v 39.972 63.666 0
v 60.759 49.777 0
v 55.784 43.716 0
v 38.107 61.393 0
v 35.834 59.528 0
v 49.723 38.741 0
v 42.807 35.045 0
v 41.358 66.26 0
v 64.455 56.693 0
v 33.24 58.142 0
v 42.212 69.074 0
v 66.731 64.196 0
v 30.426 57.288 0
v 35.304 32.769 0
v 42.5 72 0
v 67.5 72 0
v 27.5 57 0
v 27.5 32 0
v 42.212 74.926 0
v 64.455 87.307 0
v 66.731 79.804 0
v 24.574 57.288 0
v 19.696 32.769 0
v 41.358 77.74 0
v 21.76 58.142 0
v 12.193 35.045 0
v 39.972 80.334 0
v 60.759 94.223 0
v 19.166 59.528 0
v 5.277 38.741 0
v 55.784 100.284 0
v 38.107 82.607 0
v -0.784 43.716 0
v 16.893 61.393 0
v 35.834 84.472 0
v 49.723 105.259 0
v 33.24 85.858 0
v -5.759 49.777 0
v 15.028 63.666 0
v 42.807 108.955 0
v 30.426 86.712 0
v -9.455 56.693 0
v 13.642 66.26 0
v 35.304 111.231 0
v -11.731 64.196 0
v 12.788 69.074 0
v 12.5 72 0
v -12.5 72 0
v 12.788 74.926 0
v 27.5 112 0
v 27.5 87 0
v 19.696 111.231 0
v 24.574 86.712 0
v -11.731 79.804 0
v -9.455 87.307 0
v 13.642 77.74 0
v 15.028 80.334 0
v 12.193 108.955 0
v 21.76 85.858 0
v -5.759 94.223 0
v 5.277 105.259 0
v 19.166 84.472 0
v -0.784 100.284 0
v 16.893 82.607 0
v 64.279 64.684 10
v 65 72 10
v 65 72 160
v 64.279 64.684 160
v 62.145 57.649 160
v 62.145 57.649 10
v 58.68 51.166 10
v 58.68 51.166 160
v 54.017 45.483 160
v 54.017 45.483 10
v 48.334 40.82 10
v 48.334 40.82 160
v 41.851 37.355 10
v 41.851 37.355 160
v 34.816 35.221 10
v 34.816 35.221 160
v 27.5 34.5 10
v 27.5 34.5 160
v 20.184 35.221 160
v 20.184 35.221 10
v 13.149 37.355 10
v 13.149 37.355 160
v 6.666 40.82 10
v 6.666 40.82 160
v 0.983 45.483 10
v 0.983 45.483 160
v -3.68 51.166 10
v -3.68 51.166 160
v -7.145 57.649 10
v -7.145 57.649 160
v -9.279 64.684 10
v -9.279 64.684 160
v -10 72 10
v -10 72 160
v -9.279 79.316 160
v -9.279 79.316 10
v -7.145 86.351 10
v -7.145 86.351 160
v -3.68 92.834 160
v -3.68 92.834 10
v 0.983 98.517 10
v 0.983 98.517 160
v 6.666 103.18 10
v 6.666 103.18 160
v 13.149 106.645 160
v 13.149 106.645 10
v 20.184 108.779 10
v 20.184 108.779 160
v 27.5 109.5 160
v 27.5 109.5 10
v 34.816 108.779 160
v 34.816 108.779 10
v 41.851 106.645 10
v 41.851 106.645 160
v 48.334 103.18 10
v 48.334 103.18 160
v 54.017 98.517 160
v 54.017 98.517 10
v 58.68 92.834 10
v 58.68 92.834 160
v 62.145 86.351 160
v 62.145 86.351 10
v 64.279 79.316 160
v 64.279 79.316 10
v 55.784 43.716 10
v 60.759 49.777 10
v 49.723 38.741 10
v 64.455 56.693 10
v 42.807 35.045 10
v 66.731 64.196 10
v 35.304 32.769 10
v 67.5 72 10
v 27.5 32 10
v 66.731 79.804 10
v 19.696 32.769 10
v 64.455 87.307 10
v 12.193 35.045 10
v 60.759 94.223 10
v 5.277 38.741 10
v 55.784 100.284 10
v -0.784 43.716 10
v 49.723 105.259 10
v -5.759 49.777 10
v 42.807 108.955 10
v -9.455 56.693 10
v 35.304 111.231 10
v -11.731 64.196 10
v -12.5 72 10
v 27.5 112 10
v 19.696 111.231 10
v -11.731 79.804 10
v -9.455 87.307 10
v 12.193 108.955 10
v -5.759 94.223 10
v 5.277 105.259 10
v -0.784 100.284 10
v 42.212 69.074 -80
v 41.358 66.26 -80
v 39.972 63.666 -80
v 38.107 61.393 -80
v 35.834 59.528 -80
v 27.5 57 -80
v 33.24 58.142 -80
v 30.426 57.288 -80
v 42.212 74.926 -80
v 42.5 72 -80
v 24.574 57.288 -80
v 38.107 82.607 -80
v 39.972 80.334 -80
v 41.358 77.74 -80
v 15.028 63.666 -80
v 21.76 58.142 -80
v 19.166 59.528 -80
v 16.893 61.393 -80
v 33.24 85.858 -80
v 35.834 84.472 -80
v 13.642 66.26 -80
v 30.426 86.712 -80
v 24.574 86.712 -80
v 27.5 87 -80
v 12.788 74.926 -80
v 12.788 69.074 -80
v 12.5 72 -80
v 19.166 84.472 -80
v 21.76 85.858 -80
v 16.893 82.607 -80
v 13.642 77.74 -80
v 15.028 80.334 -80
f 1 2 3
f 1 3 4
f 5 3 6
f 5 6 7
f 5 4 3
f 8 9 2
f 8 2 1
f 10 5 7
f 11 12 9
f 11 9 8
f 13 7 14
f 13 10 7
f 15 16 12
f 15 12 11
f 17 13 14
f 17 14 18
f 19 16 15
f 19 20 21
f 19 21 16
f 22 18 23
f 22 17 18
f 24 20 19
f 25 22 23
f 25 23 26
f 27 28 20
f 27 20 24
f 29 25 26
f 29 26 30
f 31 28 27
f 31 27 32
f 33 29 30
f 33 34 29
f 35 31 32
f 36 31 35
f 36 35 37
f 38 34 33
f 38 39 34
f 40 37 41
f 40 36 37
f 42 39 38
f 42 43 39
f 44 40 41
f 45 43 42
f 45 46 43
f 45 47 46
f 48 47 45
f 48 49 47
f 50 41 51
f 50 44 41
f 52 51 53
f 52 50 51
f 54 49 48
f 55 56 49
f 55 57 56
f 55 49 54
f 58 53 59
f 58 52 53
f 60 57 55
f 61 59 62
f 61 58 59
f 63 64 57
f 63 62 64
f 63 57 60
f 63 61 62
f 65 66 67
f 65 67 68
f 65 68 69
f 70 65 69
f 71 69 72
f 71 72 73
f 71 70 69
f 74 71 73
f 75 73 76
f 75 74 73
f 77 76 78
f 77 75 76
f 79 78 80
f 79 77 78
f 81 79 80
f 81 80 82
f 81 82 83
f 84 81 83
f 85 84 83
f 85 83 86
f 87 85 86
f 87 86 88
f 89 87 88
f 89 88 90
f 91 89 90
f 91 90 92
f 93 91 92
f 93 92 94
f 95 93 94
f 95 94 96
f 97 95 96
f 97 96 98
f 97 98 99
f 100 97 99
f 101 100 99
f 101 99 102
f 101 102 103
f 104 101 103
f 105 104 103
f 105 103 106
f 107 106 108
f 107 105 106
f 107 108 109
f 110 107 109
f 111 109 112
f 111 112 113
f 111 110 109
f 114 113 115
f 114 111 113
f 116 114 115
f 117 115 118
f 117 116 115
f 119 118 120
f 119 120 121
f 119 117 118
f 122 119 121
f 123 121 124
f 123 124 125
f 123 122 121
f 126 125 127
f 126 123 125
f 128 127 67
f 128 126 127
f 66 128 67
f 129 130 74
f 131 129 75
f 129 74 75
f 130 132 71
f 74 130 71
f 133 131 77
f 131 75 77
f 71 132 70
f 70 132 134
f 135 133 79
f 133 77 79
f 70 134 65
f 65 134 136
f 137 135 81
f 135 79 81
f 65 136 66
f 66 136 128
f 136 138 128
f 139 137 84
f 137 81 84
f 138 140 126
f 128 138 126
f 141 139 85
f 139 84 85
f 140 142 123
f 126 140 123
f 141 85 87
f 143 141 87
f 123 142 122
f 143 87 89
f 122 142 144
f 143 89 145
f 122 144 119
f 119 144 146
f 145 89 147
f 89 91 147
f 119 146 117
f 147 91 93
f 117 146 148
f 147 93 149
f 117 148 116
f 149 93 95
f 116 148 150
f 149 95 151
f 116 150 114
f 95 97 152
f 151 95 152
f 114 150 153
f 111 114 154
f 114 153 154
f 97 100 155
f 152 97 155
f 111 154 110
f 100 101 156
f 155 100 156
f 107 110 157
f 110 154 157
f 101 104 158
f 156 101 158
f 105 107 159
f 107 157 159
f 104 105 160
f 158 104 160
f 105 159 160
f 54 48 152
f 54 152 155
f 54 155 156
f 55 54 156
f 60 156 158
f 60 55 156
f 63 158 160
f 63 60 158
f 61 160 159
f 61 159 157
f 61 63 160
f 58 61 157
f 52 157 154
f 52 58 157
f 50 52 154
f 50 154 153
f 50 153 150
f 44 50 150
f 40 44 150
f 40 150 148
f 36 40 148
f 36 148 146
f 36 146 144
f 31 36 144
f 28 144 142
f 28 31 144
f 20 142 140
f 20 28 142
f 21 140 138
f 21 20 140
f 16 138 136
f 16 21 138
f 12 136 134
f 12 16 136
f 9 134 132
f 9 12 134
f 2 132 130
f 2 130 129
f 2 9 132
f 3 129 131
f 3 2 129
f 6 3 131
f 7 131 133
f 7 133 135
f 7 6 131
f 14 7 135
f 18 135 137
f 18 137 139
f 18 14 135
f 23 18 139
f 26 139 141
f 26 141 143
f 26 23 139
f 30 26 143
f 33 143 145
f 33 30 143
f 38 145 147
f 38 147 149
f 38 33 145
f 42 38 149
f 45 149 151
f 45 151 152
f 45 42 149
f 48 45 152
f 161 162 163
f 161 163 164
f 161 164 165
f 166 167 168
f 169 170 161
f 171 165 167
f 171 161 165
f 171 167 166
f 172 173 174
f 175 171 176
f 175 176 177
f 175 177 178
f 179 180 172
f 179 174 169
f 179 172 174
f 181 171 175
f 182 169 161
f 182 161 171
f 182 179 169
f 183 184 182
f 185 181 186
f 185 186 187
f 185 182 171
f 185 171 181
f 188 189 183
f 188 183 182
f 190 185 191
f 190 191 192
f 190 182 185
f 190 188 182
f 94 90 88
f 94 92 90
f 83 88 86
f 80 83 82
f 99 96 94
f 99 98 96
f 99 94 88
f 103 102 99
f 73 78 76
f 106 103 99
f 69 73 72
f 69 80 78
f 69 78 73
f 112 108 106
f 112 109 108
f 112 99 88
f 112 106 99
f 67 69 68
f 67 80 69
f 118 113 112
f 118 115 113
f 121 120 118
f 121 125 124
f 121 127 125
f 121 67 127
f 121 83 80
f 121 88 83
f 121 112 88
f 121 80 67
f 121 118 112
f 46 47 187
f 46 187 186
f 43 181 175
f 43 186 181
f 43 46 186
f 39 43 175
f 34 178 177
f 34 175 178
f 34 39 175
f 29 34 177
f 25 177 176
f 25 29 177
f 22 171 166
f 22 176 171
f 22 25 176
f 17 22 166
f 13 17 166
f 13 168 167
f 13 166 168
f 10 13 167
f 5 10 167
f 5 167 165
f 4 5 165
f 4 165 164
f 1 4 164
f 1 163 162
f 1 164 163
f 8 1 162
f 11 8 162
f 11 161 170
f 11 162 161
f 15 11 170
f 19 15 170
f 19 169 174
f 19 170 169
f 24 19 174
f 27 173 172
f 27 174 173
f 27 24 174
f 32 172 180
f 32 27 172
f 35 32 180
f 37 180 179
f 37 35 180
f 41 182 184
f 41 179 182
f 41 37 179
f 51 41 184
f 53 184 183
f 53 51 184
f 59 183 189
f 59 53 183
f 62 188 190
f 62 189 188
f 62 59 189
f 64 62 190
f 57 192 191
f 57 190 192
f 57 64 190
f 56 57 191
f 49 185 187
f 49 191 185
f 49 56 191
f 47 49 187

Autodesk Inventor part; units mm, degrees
ref_plane "YZ Plane" through (0, 0, 0) normal (1, 0, 0) x (0, 1, 0)
ref_plane "XZ Plane" through (0, 0, 0) normal (0, 1, 0) x (-1, 0, 0)
ref_plane "XY Plane" through (0, 0, 0) normal (0, 0, 1) x (1, 0, 0)
sketch "草圖1" plane through (0, 0, 0) normal (0, 0, 1) x (1, 0, 0)
  circle A0 centre (0, 0) radius 95
  circle A1 centre (27.5, 72) radius 37.5
  dimension "d0" = 190
  dimension "d3" = 75
extrude "擠出1" add sketch "草圖1" along normal blind 160 contours A1 A0 | A0 A1 picked at (37.7638, 69.1742) picked at (30.5515, 96.5803)
sketch "草圖2" plane through (27.5, 72, 0) normal (0, 0, -1) x (-1, 0, 0)
  circle A0 centre (0, 0) radius 40
  point P0 (27.5, -72)
  dimension "d6" = 80
extrude "擠出2" add sketch "草圖2" against normal blind 10
sketch "草圖3" plane through (27.5, 72, 0) normal (0, 0, -1) x (-1, 0, 0)
  circle A0 centre (0, 0) radius 15
  point P0 (27.5, -72)
  dimension "d9" = 30
extrude "擠出3" add sketch "草圖3" along normal blind 80
properties part number "MotorPart2"
